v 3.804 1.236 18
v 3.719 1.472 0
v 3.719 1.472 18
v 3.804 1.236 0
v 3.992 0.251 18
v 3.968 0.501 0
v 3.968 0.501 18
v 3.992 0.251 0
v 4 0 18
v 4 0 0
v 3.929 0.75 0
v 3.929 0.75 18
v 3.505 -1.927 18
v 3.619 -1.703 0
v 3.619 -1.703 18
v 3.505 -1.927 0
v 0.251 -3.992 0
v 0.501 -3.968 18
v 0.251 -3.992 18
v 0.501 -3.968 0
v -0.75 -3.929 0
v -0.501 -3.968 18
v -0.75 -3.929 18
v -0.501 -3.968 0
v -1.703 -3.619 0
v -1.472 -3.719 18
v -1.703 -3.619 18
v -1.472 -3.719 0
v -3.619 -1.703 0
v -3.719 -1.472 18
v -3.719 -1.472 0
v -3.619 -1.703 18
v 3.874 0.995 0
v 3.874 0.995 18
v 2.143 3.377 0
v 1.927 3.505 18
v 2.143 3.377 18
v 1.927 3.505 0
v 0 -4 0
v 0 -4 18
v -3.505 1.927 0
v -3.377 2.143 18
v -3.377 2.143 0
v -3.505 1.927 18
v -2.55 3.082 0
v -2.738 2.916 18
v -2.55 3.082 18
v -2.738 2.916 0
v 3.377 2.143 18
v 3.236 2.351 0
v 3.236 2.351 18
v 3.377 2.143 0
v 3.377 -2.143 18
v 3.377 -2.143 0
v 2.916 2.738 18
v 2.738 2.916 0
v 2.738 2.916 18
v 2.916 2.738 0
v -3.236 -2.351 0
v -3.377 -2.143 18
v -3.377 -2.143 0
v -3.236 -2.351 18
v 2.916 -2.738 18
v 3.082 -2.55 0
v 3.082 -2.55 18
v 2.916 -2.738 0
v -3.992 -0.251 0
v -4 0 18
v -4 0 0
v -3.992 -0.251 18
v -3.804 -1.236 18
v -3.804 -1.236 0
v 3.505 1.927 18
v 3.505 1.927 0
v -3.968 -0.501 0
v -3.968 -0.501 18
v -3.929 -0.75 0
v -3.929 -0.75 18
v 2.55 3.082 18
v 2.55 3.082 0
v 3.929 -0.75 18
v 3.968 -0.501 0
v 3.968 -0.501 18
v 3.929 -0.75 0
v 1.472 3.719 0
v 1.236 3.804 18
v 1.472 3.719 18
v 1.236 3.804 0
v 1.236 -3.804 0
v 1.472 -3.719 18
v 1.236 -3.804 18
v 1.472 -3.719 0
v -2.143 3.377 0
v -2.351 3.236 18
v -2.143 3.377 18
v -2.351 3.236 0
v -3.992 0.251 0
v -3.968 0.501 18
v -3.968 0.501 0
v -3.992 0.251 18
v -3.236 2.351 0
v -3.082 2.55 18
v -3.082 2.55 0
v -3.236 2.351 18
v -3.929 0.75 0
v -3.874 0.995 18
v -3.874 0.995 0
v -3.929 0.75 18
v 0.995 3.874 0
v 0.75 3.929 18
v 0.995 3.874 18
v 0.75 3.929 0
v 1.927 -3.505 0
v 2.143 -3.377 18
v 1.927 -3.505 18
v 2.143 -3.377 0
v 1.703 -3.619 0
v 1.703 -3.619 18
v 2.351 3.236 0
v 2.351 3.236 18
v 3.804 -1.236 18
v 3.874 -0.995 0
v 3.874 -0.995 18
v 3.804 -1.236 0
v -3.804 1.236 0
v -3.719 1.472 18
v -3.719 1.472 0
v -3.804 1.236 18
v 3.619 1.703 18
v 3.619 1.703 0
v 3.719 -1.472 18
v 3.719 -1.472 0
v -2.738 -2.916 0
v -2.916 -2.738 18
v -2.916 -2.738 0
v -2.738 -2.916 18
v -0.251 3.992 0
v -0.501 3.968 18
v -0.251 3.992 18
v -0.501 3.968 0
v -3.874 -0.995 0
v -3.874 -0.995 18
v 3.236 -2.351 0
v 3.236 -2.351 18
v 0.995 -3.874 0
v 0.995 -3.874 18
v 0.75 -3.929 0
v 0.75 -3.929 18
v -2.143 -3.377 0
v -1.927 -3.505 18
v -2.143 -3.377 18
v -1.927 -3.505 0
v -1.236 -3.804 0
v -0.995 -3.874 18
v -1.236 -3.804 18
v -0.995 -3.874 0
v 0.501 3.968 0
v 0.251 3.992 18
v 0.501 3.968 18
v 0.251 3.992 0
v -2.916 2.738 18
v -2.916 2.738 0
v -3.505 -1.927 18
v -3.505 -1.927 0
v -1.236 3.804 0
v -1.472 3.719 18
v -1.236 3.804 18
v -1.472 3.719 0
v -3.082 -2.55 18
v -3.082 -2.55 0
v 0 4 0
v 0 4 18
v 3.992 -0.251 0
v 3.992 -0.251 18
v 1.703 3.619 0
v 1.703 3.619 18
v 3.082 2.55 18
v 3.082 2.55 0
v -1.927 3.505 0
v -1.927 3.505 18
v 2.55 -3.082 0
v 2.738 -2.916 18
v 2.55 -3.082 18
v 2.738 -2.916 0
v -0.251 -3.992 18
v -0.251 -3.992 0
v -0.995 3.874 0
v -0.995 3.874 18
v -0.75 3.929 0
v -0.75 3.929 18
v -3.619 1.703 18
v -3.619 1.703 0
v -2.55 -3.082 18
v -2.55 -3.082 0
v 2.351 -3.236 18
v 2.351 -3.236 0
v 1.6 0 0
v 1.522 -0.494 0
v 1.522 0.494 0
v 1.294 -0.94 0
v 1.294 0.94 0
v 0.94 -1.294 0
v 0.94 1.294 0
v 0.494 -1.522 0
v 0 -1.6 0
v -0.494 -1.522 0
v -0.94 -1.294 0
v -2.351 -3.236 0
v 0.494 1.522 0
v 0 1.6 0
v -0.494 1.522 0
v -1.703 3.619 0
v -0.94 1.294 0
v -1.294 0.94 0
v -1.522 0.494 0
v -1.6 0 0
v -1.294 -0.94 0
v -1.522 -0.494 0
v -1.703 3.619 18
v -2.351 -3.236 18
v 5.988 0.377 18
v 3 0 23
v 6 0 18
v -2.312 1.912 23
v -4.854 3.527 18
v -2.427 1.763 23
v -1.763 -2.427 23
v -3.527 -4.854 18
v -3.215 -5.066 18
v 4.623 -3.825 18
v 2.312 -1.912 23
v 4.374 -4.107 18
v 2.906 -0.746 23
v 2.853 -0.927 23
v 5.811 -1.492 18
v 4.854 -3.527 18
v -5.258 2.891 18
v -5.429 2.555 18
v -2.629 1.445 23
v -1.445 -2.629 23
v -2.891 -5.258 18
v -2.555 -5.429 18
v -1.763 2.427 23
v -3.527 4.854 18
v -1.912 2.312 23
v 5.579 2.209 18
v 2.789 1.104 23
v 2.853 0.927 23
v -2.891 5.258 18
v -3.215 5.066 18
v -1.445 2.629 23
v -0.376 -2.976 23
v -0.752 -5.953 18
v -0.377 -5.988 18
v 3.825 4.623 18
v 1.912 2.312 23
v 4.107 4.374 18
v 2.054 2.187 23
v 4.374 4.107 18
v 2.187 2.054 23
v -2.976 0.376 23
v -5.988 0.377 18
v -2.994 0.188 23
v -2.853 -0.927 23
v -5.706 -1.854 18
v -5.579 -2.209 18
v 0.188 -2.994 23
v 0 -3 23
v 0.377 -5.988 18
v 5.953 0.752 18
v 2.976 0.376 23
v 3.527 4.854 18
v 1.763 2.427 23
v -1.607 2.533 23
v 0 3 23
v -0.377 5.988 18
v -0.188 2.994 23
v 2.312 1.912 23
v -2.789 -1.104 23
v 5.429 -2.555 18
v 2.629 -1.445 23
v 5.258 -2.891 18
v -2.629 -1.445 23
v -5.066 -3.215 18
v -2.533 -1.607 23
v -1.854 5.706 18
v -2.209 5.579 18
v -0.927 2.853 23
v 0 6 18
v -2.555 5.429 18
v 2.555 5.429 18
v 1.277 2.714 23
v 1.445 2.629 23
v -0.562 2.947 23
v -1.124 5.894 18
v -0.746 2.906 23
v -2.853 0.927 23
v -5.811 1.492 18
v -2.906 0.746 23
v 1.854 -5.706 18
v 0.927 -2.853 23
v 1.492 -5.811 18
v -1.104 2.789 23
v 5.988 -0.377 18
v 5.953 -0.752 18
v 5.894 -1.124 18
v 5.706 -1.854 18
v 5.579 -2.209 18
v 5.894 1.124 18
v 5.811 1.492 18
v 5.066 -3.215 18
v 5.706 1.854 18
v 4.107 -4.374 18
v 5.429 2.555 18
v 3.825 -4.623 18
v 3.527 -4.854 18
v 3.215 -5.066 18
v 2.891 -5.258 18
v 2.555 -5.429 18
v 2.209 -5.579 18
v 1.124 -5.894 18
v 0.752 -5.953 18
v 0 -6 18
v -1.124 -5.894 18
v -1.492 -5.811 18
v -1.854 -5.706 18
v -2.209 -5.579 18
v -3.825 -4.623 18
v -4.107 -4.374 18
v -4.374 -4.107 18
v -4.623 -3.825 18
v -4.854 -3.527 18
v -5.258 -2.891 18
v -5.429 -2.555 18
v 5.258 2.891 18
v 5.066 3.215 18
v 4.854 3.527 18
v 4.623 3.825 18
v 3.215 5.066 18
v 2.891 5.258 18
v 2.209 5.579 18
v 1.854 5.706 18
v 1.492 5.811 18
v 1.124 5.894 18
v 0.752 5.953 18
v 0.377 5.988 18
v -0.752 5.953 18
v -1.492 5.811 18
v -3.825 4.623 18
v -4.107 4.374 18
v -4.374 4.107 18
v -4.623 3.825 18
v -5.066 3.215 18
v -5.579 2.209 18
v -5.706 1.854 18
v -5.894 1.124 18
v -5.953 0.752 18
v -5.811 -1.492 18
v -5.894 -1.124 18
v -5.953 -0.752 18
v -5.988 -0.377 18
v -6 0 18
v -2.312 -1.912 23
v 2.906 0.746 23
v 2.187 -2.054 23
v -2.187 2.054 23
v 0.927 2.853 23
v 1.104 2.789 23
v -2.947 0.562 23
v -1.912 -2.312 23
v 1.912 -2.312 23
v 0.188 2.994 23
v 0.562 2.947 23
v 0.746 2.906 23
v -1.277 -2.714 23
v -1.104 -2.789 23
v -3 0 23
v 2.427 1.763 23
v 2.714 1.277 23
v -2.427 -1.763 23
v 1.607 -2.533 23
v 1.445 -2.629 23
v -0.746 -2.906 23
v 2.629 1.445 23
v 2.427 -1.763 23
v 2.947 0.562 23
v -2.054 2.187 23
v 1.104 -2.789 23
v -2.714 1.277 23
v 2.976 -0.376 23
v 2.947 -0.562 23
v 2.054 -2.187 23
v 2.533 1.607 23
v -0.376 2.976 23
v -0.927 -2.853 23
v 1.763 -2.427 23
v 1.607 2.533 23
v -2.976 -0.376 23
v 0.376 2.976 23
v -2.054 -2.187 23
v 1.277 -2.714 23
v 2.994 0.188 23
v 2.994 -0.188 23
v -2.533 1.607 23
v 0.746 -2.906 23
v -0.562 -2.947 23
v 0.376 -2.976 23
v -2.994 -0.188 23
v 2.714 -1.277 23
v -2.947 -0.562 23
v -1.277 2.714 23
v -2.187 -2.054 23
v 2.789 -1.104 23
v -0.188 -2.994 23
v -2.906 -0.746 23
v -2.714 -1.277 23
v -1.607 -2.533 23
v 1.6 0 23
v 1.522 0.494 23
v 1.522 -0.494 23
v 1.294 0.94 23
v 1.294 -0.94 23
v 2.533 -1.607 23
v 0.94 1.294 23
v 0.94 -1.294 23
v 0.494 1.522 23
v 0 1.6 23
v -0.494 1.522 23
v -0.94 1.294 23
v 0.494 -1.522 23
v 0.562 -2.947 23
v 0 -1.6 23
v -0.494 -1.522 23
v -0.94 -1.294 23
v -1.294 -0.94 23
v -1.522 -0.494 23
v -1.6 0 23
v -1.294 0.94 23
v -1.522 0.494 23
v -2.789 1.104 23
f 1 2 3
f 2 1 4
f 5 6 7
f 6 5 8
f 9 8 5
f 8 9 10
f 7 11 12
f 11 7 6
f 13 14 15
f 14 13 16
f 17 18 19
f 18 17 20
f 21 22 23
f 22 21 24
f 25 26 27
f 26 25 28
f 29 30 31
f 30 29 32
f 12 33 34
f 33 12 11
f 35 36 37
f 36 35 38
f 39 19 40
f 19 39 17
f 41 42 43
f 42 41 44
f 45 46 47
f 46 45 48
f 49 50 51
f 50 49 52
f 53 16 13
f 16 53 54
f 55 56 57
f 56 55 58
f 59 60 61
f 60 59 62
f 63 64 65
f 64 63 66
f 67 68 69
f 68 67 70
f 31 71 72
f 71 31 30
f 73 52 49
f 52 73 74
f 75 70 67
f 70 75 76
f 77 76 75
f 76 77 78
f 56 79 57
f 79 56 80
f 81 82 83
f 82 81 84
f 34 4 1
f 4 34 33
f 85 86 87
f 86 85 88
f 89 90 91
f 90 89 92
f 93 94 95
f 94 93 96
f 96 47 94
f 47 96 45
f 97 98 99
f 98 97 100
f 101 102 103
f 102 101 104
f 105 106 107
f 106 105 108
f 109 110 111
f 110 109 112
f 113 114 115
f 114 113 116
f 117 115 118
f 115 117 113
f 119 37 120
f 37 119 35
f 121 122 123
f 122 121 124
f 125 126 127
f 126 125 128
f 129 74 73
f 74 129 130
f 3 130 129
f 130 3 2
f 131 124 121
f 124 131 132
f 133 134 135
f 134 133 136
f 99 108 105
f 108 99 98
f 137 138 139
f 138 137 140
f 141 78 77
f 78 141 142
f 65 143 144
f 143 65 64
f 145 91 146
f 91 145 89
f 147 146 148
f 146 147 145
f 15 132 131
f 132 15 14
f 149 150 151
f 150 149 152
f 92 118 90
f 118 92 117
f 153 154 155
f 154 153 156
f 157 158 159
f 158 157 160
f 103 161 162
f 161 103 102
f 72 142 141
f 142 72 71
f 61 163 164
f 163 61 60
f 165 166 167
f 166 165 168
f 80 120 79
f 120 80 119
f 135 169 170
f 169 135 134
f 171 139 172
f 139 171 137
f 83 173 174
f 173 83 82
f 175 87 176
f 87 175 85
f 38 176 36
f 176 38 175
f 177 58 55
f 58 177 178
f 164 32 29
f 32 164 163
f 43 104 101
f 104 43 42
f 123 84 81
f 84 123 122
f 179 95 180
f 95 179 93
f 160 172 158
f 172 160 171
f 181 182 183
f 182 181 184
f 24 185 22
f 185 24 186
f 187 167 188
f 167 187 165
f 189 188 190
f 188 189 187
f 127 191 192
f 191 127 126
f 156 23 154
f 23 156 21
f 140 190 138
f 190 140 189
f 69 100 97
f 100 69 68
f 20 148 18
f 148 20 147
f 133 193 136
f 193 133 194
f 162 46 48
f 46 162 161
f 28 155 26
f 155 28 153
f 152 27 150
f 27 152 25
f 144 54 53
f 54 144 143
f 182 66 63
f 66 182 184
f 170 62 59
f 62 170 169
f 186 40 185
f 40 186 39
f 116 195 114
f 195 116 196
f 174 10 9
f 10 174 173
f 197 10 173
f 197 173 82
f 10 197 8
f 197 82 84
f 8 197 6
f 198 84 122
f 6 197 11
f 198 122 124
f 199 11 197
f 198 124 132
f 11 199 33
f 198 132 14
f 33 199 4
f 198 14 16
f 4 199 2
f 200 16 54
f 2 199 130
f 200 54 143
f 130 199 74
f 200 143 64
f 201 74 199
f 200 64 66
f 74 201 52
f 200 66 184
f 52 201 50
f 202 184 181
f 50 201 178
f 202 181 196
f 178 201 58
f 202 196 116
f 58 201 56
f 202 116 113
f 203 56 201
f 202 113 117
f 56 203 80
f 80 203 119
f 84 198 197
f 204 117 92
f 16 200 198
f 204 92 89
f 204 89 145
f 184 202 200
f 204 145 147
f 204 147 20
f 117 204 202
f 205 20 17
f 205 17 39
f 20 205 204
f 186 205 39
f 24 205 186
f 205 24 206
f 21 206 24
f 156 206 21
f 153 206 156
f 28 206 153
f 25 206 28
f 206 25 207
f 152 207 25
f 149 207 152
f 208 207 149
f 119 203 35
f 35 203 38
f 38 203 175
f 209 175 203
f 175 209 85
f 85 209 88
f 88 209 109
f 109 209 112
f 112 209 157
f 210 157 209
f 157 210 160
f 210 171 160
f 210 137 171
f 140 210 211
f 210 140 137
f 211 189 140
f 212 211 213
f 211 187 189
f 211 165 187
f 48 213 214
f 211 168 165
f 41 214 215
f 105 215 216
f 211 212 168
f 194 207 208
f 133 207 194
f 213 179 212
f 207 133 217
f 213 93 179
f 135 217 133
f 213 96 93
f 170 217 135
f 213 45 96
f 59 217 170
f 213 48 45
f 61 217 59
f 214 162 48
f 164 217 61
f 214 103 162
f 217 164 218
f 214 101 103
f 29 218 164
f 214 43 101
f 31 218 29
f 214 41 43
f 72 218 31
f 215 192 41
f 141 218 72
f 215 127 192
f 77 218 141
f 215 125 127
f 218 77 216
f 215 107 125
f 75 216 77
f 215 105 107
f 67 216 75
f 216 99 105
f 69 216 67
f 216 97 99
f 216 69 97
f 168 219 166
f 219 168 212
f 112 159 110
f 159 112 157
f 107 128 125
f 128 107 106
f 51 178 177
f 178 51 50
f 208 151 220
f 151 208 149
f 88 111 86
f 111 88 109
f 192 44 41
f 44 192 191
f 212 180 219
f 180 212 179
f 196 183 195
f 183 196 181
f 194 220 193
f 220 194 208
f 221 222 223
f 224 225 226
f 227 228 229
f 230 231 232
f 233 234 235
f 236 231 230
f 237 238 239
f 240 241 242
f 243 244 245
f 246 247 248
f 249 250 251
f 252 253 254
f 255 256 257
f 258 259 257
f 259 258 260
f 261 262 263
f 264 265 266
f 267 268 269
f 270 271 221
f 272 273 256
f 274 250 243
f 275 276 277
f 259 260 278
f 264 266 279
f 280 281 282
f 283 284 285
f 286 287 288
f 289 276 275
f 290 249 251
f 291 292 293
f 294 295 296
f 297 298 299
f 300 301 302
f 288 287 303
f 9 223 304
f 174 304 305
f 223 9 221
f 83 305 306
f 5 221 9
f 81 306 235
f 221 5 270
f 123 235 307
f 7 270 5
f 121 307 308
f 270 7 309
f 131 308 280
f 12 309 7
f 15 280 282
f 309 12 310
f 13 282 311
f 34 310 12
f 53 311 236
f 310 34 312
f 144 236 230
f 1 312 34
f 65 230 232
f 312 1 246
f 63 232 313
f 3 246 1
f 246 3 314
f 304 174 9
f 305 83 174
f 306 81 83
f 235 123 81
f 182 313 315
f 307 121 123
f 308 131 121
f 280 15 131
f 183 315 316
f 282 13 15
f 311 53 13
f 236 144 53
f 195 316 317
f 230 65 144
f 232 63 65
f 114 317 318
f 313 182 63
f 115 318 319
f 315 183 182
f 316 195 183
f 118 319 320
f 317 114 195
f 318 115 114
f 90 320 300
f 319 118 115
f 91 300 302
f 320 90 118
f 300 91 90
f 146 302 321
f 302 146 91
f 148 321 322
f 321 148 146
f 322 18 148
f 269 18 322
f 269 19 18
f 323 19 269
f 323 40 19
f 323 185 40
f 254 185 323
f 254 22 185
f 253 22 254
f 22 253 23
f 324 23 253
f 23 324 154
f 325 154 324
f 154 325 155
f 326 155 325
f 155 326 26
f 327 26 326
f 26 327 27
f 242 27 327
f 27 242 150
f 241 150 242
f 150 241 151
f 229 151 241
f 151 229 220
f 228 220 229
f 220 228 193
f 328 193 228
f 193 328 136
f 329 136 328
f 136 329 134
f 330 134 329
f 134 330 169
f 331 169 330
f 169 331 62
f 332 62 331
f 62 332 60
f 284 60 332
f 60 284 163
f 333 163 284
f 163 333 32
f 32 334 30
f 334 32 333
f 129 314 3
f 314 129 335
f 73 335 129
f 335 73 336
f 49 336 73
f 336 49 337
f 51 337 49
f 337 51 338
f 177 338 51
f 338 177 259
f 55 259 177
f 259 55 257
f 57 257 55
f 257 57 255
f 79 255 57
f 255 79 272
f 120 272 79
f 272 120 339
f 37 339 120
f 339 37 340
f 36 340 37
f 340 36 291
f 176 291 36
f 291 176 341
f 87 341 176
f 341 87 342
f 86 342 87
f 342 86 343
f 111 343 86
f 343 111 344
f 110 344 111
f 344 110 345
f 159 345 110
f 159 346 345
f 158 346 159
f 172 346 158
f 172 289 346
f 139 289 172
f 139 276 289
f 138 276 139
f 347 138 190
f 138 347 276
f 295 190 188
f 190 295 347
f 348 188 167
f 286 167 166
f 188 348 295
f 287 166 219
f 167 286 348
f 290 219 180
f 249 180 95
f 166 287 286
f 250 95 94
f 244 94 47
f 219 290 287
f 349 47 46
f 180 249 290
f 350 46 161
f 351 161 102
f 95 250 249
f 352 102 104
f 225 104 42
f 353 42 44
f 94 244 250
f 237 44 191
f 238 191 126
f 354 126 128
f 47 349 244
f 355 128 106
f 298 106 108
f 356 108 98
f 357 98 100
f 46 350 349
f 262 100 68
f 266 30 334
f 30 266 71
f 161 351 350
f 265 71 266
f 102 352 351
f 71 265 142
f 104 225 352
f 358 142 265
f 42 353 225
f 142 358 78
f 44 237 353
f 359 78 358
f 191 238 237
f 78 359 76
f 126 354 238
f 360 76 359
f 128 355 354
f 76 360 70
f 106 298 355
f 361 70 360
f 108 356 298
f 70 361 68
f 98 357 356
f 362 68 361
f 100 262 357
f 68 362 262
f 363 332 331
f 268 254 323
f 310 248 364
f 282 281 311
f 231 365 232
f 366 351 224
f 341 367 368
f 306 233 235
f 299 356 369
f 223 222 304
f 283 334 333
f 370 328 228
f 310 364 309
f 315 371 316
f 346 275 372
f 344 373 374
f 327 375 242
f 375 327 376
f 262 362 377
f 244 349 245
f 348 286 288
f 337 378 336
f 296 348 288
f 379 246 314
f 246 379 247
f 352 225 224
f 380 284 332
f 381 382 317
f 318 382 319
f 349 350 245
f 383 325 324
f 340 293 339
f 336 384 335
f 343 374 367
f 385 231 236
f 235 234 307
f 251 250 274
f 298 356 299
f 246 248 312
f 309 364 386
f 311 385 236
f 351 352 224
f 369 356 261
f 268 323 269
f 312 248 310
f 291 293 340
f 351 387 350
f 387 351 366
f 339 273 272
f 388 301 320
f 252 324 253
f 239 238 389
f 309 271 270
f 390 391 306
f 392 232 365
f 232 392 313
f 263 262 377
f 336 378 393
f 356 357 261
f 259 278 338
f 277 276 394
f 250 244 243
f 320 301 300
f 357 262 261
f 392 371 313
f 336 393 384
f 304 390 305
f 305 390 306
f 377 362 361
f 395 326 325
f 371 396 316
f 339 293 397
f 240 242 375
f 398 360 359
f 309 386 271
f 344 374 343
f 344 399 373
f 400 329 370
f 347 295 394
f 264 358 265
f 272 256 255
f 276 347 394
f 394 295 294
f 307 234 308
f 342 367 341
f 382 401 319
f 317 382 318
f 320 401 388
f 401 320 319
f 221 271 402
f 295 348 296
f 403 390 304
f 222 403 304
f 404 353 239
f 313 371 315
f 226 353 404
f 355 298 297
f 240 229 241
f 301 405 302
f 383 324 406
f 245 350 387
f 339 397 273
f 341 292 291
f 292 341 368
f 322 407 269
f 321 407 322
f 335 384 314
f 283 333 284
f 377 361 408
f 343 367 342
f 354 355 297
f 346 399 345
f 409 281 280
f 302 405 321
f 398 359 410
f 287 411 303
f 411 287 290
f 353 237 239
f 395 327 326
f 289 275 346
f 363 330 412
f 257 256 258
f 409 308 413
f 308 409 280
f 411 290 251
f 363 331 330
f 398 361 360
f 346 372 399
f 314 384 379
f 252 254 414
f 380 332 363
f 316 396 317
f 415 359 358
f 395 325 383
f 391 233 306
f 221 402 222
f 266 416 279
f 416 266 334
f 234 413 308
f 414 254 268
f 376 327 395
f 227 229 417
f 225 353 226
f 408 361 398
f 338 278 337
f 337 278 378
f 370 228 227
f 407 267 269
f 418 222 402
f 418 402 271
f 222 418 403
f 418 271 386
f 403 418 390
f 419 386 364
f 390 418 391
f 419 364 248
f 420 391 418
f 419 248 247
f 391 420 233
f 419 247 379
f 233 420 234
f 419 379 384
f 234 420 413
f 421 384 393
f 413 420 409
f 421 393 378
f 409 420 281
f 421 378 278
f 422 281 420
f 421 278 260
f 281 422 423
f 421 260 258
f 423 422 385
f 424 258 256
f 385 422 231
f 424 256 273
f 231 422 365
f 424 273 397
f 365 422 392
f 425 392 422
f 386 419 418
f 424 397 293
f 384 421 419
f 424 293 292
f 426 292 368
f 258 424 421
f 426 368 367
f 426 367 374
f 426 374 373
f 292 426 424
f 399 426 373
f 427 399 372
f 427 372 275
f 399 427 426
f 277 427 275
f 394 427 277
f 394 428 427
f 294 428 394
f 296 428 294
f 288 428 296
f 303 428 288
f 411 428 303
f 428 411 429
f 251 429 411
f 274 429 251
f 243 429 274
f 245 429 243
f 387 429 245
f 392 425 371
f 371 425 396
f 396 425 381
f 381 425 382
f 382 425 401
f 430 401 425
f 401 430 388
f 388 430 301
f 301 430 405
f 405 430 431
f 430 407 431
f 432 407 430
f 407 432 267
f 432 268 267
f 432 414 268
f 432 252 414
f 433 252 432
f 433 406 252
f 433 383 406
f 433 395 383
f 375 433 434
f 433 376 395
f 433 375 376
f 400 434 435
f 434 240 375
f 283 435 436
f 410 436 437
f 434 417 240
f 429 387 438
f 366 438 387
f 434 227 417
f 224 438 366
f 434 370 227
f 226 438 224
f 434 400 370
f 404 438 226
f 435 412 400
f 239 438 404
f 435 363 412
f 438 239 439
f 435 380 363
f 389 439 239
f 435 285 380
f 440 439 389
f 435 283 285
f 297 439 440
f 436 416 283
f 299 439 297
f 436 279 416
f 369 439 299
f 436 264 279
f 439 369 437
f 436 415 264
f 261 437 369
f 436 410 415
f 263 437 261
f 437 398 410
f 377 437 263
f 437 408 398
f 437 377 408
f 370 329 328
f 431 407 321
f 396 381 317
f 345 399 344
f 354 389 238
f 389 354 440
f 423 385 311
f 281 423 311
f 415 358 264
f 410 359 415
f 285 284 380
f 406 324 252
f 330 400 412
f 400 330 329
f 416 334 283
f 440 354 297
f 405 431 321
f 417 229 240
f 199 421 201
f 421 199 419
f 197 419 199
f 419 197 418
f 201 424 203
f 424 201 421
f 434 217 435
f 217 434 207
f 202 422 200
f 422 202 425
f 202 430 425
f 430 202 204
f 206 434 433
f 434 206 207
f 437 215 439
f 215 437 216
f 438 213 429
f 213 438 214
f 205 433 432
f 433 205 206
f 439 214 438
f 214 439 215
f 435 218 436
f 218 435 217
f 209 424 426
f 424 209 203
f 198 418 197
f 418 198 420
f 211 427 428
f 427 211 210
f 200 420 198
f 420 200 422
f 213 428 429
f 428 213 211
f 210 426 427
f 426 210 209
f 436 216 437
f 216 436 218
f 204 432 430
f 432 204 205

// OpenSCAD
difference(){
    
    union(){
        cylinder (h = 19, r=4, center = false, $fn=100);
        translate([0,0,18])cylinder (h = 5, r1=6, r2=3, center = false, $fn=100);
    }
    cylinder (h = 23, r=1.6, center = false, $fn=20);
}
